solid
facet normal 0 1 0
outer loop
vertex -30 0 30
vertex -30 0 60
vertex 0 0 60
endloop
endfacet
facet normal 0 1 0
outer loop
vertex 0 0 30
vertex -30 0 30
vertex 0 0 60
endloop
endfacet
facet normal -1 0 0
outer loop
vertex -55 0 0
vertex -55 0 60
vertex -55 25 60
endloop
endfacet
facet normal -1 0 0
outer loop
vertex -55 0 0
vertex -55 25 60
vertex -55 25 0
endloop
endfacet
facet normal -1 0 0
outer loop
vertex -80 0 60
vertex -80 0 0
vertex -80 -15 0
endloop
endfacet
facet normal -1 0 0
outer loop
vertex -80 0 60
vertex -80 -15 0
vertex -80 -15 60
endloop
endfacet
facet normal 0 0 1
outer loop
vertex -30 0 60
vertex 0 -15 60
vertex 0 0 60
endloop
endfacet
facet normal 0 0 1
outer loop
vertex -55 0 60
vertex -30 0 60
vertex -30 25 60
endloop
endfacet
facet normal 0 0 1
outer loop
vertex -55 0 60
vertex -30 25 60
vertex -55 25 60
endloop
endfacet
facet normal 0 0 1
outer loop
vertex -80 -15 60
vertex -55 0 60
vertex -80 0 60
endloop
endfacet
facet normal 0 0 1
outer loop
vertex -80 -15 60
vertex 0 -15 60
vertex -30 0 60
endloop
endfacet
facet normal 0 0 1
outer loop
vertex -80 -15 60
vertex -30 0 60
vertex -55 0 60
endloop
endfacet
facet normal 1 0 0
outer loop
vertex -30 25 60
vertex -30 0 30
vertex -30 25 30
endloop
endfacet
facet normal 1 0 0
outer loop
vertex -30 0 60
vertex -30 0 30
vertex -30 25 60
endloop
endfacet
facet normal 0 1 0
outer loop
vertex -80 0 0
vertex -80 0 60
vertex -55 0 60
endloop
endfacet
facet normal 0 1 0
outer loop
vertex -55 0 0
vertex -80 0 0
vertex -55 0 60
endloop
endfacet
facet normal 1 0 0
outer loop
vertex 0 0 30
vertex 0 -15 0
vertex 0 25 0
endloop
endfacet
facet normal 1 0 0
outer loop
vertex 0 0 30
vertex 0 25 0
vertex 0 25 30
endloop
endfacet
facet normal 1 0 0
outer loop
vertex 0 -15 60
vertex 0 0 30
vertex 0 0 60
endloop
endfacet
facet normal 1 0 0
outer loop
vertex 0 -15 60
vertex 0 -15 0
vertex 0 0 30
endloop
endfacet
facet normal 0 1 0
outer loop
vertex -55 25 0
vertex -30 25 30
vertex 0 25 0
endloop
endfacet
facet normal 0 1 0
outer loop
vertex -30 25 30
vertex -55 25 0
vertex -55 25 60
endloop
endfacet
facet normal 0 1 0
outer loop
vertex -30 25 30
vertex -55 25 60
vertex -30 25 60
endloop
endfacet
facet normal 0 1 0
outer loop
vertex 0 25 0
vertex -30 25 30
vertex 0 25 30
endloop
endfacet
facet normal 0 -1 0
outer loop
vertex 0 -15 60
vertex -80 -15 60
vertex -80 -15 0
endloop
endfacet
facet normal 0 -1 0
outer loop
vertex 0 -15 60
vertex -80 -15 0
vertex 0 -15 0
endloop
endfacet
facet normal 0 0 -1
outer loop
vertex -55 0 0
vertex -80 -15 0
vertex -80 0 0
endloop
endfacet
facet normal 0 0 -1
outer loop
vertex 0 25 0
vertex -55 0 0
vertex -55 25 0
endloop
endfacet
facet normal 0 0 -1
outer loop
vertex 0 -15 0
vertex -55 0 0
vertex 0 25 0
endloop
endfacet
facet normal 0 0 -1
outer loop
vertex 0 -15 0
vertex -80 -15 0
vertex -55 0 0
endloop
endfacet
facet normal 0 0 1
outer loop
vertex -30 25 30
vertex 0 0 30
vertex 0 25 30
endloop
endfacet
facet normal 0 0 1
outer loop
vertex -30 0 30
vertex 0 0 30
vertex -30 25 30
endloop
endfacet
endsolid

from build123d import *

# Parameters (mm, degrees)
F0_W     = 80
F0_H     = 60
F1_DEPTH = 15
F3_DEPTH = 25


with BuildPart() as f1:
    # F0 (on Front) → F1 (new body)
    with BuildSketch(Plane.XZ):
        with Locations((-40, 30)):
            Rectangle(F0_W, F0_H)
    extrude(amount=F1_DEPTH)

    # F2 (on Front) → F3 (join)
    with BuildSketch(Plane.XZ):
        Polygon((-55, 0), (0, 0), (0, 30), (-30, 30), (-30, 60), (-55, 60), (-55, 53.417352), align=None)
    extrude(amount=-F3_DEPTH)


solid = f1.part
